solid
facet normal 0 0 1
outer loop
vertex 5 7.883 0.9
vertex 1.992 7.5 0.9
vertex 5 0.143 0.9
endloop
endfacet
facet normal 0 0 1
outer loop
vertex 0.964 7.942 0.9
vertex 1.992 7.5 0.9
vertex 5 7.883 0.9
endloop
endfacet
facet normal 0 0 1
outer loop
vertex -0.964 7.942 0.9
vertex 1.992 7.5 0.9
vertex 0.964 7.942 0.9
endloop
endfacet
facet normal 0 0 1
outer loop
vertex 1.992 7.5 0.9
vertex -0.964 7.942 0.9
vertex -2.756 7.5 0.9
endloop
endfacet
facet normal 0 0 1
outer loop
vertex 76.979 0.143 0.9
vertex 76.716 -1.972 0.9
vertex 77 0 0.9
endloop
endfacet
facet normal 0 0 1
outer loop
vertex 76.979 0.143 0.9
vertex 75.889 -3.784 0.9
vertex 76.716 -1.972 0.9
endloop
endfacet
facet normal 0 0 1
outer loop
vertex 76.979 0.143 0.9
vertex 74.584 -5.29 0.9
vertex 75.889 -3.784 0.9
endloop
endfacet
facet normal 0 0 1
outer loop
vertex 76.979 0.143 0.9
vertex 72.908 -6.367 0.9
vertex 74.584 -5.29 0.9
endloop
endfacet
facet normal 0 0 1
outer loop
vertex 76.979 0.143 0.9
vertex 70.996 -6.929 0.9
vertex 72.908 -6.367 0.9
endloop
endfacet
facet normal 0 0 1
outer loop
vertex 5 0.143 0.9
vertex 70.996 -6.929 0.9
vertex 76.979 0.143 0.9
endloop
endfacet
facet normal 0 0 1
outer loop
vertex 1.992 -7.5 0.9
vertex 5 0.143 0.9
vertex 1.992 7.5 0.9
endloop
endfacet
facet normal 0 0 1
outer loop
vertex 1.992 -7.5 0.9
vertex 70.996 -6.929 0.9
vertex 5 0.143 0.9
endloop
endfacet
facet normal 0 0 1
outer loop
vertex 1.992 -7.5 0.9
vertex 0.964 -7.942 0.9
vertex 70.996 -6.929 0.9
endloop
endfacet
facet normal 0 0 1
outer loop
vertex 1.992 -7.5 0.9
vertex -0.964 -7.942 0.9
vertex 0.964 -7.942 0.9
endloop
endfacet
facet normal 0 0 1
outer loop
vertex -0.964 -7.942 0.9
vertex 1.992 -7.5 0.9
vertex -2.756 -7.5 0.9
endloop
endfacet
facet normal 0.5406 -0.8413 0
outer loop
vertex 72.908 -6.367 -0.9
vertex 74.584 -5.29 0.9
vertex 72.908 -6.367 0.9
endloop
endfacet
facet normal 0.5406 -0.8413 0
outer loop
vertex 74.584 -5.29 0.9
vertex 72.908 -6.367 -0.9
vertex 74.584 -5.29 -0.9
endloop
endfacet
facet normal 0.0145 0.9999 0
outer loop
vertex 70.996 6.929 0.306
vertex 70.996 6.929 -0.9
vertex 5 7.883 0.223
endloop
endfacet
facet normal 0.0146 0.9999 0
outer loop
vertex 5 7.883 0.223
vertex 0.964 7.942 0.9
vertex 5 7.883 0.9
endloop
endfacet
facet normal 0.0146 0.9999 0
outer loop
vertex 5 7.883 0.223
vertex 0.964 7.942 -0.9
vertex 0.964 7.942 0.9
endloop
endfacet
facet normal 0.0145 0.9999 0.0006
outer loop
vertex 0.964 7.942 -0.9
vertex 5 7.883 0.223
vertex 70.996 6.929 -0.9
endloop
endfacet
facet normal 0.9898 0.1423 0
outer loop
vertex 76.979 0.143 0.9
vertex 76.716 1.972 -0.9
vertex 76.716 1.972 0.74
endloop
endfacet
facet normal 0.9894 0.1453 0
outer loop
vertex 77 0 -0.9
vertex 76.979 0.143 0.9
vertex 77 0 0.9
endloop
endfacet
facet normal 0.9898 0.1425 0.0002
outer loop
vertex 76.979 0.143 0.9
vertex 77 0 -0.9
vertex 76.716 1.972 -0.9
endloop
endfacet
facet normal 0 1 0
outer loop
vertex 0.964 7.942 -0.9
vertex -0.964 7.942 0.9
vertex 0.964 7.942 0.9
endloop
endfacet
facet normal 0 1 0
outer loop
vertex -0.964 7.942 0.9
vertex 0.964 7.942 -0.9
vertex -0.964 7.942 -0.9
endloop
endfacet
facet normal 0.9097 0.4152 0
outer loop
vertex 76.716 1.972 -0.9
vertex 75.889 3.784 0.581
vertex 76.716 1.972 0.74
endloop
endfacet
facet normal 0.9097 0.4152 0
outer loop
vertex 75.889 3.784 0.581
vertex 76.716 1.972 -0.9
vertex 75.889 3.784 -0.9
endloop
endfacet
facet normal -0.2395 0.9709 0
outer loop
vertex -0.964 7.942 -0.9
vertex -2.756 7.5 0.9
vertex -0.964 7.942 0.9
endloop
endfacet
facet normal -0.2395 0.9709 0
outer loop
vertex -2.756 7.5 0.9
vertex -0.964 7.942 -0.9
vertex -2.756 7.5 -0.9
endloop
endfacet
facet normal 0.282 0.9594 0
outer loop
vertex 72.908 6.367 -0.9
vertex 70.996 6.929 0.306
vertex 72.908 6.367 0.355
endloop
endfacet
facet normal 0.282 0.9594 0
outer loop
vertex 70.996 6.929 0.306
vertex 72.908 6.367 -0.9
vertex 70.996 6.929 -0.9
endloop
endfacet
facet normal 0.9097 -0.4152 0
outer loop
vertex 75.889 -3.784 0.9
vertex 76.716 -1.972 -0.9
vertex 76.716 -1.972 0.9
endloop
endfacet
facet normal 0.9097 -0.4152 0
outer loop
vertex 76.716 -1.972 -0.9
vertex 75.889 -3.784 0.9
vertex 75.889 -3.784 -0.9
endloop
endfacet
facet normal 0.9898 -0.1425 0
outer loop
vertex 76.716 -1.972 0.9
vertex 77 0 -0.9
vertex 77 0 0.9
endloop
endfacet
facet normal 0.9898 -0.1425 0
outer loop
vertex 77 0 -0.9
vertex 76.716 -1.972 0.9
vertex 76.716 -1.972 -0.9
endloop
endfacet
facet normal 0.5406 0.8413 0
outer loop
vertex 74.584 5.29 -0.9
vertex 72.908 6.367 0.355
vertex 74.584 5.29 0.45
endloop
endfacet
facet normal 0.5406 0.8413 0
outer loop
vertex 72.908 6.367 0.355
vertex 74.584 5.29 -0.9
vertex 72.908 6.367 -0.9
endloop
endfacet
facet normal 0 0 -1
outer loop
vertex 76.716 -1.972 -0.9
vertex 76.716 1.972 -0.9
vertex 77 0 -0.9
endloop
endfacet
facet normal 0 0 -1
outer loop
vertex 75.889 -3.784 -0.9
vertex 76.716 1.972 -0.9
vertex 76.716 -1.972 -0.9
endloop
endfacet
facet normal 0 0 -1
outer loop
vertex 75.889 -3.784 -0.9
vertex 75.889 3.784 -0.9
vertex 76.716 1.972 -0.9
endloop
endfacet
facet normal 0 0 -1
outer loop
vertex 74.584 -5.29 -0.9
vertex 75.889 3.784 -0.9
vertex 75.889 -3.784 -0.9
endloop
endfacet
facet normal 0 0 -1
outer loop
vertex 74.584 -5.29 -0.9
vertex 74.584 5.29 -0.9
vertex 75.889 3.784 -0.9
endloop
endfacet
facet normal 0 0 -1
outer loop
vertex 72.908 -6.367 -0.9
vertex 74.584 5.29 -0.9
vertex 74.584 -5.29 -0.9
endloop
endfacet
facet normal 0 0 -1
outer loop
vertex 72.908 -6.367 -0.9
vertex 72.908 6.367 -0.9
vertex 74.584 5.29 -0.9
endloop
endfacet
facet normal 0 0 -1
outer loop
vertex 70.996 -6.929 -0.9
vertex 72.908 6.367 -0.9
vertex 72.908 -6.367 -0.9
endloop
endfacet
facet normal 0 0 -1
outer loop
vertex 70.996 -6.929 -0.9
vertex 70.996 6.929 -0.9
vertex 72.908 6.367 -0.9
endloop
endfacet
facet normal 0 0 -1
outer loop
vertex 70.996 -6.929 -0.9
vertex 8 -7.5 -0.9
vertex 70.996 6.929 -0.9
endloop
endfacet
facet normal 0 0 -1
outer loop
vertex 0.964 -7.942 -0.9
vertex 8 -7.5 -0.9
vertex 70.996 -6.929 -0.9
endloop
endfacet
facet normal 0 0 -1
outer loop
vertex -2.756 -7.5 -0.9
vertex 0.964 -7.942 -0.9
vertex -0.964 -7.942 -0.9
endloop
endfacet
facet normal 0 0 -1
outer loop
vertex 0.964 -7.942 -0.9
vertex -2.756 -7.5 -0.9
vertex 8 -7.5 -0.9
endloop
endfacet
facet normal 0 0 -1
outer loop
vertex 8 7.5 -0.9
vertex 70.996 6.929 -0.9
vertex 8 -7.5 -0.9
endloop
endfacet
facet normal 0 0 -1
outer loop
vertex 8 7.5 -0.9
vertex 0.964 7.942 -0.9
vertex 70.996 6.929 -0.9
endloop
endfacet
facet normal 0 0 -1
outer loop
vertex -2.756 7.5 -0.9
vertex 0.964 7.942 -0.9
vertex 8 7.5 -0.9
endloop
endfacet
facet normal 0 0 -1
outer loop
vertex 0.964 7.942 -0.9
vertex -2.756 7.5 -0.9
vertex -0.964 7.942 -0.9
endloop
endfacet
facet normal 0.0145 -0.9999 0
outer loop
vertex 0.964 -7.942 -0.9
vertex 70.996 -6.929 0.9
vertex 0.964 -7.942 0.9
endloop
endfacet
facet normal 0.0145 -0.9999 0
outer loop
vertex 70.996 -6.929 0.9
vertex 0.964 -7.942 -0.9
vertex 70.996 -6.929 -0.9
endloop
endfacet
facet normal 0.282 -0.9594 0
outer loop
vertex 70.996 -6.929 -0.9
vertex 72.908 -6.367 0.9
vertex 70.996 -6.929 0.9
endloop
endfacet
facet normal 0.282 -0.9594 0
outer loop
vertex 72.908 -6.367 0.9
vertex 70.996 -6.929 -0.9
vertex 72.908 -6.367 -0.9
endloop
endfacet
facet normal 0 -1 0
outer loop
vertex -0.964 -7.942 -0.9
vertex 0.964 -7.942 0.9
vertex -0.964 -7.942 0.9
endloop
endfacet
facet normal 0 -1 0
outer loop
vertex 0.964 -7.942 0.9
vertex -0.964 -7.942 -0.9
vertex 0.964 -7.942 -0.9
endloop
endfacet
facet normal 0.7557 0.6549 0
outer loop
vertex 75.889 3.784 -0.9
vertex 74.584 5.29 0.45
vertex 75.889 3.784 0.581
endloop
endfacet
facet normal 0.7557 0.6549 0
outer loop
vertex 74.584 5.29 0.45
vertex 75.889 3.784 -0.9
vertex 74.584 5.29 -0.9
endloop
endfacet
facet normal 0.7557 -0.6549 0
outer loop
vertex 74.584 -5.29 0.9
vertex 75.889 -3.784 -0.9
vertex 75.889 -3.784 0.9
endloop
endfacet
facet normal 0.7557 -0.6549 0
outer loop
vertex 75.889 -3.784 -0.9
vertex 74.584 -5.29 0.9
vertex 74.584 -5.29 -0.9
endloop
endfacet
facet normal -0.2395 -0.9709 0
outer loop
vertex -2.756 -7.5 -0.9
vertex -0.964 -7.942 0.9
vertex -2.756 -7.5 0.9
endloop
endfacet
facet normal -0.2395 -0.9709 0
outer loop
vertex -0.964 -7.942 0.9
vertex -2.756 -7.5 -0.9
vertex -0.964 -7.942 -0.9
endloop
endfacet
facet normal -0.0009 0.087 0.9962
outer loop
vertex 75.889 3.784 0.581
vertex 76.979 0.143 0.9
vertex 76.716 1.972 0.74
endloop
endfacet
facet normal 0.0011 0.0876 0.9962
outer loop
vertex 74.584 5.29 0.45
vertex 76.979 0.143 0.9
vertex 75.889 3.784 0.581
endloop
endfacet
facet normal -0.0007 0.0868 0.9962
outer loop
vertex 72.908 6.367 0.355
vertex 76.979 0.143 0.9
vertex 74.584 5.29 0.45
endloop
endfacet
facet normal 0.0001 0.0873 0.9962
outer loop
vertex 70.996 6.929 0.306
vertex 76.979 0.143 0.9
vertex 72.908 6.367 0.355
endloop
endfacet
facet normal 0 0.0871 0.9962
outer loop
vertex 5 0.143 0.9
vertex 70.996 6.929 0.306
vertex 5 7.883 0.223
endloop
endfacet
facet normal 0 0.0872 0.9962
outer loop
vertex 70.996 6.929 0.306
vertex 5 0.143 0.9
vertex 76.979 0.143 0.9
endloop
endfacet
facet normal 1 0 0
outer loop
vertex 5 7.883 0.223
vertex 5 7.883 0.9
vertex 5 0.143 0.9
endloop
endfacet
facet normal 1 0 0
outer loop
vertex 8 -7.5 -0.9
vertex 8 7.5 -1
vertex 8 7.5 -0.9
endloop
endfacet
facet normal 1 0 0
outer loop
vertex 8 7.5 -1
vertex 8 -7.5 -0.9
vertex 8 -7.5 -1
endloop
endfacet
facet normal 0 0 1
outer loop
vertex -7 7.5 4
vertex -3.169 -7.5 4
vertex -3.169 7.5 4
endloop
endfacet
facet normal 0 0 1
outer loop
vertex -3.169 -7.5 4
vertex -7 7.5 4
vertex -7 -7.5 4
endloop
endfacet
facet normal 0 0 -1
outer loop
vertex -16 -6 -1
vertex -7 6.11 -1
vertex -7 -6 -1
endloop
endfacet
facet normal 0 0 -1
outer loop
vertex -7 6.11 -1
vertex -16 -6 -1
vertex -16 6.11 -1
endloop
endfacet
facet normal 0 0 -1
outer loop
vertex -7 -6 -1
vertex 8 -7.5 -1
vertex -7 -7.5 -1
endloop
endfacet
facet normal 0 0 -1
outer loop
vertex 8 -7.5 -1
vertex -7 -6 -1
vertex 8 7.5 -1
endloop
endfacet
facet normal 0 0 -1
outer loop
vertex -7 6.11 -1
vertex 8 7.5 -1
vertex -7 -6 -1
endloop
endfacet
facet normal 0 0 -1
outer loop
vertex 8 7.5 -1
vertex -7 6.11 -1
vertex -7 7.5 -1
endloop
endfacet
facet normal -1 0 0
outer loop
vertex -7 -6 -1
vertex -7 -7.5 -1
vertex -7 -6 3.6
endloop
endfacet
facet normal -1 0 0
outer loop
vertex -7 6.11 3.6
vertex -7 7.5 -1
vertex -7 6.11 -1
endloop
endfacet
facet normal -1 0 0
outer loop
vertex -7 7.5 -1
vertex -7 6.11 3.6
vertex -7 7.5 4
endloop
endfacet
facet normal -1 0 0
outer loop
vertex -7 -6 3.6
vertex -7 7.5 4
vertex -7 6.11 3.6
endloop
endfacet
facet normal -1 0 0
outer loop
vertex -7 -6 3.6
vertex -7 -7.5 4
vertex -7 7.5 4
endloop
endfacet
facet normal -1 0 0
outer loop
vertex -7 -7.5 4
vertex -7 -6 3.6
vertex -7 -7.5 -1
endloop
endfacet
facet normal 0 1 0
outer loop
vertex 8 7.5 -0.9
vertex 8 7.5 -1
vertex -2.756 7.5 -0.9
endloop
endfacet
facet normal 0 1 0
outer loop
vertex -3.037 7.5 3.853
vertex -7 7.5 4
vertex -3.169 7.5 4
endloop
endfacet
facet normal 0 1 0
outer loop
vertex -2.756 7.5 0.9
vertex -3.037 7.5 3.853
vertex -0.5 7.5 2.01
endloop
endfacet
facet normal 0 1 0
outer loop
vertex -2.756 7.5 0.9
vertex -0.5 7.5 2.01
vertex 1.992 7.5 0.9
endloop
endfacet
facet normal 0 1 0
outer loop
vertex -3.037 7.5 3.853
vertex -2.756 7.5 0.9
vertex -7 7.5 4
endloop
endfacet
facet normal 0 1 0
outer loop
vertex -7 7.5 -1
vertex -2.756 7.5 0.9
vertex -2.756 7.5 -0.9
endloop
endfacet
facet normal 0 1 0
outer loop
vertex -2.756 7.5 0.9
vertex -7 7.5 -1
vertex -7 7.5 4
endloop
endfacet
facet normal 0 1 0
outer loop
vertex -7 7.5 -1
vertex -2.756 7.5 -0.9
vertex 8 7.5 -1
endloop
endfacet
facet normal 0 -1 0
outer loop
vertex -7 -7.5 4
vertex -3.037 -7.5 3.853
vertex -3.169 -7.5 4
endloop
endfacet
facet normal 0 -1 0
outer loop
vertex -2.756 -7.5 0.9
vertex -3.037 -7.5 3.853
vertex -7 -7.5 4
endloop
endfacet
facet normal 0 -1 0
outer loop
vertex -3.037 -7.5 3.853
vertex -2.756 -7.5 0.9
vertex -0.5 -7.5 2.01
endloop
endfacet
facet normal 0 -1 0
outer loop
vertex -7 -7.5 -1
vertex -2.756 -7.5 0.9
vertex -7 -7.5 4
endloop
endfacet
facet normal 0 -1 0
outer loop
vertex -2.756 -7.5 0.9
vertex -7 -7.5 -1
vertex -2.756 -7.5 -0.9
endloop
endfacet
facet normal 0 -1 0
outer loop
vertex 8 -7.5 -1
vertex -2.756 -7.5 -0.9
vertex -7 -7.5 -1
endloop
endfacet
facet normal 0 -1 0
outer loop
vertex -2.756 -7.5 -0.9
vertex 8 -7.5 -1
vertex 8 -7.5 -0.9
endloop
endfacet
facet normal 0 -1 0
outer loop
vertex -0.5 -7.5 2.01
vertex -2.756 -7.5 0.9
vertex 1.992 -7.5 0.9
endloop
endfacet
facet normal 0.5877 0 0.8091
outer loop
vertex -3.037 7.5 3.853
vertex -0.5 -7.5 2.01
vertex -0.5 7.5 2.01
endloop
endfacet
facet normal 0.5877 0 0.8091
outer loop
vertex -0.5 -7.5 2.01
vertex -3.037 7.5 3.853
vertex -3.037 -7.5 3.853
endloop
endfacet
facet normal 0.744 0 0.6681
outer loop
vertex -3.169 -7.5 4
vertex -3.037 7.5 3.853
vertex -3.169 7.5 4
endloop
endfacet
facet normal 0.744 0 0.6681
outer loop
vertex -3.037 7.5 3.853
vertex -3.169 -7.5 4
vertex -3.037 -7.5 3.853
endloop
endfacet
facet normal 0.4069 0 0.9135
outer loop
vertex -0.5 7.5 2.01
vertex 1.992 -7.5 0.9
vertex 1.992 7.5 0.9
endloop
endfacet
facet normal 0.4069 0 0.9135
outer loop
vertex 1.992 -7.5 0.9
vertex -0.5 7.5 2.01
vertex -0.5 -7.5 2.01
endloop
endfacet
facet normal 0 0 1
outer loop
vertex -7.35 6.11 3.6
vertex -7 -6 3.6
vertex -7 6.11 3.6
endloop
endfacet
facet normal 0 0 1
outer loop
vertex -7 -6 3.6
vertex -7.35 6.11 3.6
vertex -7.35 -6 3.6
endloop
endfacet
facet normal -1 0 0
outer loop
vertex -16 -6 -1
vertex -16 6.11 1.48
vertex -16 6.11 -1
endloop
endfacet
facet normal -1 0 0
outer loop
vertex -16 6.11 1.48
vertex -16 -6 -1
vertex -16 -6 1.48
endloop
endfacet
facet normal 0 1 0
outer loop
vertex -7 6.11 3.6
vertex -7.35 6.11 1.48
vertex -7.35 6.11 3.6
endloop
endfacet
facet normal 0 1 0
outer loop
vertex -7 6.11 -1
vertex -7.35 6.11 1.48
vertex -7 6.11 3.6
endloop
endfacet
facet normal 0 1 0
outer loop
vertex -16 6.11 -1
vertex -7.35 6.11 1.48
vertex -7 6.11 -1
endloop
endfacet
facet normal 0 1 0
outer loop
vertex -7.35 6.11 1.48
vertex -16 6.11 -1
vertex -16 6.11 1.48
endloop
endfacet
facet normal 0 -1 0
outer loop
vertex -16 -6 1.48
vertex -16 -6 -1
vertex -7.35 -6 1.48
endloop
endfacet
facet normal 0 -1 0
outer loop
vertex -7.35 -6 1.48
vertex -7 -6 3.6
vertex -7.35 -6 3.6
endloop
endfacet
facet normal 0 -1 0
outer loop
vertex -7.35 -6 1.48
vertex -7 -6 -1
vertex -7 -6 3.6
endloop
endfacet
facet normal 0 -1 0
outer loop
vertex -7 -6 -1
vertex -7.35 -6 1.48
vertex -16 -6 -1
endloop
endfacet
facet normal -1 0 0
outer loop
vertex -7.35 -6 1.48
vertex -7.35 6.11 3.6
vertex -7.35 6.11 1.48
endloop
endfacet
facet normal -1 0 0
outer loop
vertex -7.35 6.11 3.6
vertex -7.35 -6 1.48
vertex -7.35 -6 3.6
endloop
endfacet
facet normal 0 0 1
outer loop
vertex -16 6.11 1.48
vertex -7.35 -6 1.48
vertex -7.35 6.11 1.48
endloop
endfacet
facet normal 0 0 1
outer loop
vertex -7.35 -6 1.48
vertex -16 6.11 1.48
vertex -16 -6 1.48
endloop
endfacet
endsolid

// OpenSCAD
module usb(){

difference(){

cube ([11.8,12.11,4.6]);

translate([0,0,2.48])
cube([8.65,12.11,2.12]);

}}



module knife(){



linear_extrude(height = 1.8, center = true, convexity = 10, twist = 0)
translate([0, 0, 0])

hull() {
   translate([0,0,0]) circle(8);
   translate([70,0,0])
   circle(7);
   translate([15,0,0])
   circle(2);
  
 }
}

difference(){
knife();

translate([5,-1,1])
rotate([-5,0,0])
cube([80,10,10]);
}

difference(){

translate([-7,-7.5,-1])
cube([15,15,5]);

translate([7,10,15])
rotate([90,0,0])
cylinder(h = 30, r = 15);
}

translate([-16,-6,-1])
usb();
